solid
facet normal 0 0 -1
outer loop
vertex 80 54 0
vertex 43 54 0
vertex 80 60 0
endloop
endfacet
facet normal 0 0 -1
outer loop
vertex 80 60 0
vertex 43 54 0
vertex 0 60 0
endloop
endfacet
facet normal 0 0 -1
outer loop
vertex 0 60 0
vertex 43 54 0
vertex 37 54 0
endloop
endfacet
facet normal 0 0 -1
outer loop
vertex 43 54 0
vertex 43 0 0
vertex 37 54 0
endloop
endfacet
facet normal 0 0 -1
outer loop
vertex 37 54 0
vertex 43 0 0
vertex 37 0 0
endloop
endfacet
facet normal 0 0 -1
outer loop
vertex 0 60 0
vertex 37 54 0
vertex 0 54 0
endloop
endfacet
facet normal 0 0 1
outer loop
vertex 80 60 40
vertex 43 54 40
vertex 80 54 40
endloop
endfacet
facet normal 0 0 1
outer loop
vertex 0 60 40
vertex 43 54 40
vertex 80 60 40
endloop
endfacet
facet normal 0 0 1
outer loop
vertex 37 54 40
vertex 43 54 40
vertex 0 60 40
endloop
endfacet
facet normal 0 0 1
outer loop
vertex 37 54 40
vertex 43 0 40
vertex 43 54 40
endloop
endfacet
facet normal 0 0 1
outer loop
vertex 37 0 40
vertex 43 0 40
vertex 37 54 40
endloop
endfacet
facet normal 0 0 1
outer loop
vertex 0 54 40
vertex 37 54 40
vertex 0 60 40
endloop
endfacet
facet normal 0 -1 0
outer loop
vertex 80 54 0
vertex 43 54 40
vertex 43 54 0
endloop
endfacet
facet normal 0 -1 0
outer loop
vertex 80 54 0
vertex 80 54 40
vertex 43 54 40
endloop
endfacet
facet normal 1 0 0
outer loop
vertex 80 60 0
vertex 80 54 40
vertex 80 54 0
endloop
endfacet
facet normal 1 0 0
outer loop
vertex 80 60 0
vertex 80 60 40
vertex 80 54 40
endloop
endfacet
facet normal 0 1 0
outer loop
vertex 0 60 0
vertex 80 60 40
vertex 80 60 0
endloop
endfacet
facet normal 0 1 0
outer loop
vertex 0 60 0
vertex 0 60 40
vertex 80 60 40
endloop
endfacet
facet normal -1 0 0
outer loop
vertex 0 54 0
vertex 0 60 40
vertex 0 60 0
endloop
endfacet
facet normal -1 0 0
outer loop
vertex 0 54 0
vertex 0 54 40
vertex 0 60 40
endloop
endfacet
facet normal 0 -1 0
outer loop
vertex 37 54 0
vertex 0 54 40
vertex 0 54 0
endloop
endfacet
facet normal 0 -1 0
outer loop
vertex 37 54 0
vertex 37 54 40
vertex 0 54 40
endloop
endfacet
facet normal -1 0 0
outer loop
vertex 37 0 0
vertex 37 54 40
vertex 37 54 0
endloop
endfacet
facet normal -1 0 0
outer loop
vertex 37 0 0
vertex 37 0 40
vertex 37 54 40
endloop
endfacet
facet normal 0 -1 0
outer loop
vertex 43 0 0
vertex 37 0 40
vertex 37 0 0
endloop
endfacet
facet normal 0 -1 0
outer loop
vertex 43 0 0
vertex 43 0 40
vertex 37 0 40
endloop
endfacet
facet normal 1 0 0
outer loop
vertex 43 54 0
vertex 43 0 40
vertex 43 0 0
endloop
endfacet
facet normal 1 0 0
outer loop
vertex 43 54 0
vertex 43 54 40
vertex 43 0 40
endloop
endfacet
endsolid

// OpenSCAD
$fn = 32;

// ----------------------------------------------------------------------
// Structural section: tee 80 x 60 mm
// ----------------------------------------------------------------------

// --- parameters (mm) ---
sec_w = 80;               // tee width, X
sec_h = 60;               // tee height, Y
flange_t = 6;             // top flange thickness
web_t = 6;                // web thickness
plate_t = 40;             // cut length, Z (extrusion height)

profile = [[37, 0], [43, 0], [43, 54], [80, 54], [80, 60], [0, 60], [0, 54], [37, 54]];  // primary outline, 8 points, counter clockwise

// --- the one profile operation ---
linear_extrude(height = plate_t) polygon(points = profile);
